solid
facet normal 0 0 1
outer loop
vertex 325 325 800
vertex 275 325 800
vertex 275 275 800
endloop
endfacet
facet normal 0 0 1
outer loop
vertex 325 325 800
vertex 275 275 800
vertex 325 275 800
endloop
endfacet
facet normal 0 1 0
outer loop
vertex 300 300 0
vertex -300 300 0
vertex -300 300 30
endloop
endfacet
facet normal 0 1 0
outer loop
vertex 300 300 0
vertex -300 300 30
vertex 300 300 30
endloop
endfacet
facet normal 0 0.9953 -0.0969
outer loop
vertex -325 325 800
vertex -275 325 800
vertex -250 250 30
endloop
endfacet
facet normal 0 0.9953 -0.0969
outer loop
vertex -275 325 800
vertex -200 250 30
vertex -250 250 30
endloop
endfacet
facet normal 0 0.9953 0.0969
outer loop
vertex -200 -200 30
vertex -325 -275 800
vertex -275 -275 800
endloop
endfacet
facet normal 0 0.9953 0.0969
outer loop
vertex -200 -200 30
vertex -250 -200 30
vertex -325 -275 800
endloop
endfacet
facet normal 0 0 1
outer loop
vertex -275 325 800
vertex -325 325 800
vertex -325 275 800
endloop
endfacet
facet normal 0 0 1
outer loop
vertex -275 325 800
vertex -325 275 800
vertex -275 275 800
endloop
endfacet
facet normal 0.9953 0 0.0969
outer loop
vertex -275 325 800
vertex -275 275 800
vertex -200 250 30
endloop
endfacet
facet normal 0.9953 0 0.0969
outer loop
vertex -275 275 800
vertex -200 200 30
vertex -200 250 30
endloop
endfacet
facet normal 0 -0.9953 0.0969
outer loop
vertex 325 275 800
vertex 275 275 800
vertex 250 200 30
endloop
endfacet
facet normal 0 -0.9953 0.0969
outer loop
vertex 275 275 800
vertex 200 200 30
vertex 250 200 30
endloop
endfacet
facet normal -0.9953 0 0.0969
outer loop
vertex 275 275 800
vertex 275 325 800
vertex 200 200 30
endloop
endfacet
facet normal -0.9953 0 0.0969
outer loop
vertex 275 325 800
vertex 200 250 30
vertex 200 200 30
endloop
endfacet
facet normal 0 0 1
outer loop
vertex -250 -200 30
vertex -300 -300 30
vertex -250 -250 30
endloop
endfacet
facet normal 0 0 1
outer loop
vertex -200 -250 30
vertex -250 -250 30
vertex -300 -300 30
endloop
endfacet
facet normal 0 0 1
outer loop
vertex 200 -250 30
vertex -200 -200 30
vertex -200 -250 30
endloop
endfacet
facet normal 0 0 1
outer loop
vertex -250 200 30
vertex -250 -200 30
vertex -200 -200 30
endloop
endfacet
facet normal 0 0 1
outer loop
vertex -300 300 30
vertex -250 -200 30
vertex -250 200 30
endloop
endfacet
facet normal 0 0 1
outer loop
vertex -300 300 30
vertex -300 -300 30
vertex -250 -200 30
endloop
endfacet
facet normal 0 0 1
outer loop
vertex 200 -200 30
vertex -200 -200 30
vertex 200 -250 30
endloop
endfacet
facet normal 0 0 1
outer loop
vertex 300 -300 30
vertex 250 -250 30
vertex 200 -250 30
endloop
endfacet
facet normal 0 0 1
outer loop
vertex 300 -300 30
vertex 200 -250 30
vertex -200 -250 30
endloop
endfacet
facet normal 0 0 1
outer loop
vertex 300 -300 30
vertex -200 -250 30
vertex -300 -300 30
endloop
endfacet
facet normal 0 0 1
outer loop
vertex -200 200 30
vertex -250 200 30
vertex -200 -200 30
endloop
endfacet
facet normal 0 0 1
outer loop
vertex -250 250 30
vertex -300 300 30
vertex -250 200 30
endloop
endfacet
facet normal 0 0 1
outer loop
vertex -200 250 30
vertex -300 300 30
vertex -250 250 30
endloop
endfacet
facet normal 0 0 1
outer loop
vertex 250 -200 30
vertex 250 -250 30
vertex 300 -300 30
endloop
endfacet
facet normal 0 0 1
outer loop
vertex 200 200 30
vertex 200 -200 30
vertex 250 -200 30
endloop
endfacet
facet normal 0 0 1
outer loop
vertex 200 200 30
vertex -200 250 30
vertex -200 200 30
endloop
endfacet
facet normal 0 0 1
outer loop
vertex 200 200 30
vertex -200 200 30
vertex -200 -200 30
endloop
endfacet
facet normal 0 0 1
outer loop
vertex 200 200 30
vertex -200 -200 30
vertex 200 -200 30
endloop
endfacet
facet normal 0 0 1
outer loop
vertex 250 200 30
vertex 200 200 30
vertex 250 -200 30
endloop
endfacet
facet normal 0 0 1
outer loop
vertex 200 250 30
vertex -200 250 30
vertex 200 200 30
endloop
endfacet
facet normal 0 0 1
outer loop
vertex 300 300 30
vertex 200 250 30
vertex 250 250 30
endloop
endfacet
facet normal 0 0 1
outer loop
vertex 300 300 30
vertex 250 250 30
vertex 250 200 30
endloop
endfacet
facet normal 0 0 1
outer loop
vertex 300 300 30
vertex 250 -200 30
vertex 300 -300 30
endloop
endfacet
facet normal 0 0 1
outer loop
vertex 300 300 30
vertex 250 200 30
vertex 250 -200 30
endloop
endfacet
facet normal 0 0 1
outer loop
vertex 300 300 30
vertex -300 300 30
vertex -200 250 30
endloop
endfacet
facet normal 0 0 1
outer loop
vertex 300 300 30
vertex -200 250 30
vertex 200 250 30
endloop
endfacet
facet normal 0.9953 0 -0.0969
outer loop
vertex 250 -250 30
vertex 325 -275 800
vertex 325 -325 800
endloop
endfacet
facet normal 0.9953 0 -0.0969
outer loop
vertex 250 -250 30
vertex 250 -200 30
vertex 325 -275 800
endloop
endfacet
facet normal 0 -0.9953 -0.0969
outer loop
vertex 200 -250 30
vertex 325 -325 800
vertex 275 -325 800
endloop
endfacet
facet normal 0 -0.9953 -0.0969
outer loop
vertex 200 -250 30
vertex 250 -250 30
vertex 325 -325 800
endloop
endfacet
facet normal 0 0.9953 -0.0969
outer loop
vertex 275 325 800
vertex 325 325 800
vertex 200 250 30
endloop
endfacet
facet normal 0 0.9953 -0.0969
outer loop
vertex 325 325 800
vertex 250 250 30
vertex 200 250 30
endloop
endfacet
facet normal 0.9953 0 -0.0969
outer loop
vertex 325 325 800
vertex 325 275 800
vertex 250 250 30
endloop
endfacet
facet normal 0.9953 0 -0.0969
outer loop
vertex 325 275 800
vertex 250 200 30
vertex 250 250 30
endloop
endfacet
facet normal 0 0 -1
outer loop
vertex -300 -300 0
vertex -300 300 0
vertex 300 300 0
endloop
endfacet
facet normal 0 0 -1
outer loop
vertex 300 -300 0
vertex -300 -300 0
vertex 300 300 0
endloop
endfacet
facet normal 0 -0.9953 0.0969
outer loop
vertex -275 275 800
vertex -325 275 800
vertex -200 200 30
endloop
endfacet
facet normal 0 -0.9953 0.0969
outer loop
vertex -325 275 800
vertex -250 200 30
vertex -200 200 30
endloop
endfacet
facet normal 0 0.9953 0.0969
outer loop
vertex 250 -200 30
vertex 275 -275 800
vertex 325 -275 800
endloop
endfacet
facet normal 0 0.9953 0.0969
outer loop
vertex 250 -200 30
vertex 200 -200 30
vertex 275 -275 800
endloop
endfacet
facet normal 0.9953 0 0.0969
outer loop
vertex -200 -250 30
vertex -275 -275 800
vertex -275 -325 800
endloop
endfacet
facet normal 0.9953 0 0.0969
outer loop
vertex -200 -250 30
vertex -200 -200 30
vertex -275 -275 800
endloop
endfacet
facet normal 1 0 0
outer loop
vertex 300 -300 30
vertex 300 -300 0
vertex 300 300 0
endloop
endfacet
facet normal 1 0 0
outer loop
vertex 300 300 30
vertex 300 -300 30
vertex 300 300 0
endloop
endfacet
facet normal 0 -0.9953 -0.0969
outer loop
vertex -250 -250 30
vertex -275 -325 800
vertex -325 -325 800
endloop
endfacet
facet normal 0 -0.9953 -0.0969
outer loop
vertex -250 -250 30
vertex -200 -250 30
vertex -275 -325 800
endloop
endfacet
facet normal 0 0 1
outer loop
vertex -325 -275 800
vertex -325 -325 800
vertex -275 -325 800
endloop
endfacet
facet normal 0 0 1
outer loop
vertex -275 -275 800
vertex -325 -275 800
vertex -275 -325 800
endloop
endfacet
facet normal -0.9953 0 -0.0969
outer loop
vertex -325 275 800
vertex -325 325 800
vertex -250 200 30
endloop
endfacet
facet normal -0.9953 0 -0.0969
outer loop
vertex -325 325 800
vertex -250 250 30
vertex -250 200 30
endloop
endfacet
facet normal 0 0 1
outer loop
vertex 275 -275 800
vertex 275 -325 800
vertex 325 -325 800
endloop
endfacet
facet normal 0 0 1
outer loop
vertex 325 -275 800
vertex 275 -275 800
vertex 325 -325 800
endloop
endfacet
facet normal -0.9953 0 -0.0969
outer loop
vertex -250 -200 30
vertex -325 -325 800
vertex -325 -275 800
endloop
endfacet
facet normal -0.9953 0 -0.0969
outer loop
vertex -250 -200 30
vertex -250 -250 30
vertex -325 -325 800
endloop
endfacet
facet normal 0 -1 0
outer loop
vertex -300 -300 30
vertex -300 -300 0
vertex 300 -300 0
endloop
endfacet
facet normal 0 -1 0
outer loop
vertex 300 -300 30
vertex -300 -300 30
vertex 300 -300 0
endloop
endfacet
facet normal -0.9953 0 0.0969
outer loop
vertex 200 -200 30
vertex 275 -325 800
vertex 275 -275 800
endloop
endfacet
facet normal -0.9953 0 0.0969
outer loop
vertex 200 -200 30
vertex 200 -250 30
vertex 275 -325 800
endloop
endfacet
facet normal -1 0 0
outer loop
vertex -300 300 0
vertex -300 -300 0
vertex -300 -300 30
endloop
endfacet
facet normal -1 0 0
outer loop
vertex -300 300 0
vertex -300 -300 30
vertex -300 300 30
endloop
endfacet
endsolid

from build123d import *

# Parameters (mm, degrees)
F0_W     = 600
F0_H     = 600
F0_W_2   = 500
F0_H_2   = 500
F1_DEPTH = 30
F4_W     = 50
F4_H     = 50
F2_W     = 50
F2_H     = 50
F7_W     = 50
F7_H     = 50
F6_W     = 50
F6_H     = 50


with BuildPart() as f1:
    # F0 (on Top) → F1 (new body)
    with BuildSketch(Plane.XY):
        Rectangle(F0_W, F0_H)
        Rectangle(F0_W_2, F0_H_2, mode=Mode.SUBTRACT)
        Rectangle(F0_W_2, F0_H_2)
    extrude(amount=F1_DEPTH)

    # F4 (on offset) → F5 section 0
    with BuildSketch(Plane.XY.offset(800)):
        with Locations((-300, 300)):
            Rectangle(F4_W, F4_H)
    # F2 (on face) → F5 section 1
    with BuildSketch(Plane.XY.offset(30)):
        with Locations((-225, 225)):
            Rectangle(F2_W, F2_H)
    loft()

    # F7 (on offset) → F8 section 0
    with BuildSketch(Plane.XY.offset(800)):
        with Locations((300, 300)):
            Rectangle(F7_W, F7_H)
    # F6 (on face) → F8 section 1
    with BuildSketch(Plane.XY.offset(30)):
        with Locations((225, 225)):
            Rectangle(F6_W, F6_H)
    loft()

    # F9: F1 across plane


with BuildPart() as f1_1:
    add(f1.part)
    add(f1.part.mirror(Plane.XZ))


solid = f1_1.part
